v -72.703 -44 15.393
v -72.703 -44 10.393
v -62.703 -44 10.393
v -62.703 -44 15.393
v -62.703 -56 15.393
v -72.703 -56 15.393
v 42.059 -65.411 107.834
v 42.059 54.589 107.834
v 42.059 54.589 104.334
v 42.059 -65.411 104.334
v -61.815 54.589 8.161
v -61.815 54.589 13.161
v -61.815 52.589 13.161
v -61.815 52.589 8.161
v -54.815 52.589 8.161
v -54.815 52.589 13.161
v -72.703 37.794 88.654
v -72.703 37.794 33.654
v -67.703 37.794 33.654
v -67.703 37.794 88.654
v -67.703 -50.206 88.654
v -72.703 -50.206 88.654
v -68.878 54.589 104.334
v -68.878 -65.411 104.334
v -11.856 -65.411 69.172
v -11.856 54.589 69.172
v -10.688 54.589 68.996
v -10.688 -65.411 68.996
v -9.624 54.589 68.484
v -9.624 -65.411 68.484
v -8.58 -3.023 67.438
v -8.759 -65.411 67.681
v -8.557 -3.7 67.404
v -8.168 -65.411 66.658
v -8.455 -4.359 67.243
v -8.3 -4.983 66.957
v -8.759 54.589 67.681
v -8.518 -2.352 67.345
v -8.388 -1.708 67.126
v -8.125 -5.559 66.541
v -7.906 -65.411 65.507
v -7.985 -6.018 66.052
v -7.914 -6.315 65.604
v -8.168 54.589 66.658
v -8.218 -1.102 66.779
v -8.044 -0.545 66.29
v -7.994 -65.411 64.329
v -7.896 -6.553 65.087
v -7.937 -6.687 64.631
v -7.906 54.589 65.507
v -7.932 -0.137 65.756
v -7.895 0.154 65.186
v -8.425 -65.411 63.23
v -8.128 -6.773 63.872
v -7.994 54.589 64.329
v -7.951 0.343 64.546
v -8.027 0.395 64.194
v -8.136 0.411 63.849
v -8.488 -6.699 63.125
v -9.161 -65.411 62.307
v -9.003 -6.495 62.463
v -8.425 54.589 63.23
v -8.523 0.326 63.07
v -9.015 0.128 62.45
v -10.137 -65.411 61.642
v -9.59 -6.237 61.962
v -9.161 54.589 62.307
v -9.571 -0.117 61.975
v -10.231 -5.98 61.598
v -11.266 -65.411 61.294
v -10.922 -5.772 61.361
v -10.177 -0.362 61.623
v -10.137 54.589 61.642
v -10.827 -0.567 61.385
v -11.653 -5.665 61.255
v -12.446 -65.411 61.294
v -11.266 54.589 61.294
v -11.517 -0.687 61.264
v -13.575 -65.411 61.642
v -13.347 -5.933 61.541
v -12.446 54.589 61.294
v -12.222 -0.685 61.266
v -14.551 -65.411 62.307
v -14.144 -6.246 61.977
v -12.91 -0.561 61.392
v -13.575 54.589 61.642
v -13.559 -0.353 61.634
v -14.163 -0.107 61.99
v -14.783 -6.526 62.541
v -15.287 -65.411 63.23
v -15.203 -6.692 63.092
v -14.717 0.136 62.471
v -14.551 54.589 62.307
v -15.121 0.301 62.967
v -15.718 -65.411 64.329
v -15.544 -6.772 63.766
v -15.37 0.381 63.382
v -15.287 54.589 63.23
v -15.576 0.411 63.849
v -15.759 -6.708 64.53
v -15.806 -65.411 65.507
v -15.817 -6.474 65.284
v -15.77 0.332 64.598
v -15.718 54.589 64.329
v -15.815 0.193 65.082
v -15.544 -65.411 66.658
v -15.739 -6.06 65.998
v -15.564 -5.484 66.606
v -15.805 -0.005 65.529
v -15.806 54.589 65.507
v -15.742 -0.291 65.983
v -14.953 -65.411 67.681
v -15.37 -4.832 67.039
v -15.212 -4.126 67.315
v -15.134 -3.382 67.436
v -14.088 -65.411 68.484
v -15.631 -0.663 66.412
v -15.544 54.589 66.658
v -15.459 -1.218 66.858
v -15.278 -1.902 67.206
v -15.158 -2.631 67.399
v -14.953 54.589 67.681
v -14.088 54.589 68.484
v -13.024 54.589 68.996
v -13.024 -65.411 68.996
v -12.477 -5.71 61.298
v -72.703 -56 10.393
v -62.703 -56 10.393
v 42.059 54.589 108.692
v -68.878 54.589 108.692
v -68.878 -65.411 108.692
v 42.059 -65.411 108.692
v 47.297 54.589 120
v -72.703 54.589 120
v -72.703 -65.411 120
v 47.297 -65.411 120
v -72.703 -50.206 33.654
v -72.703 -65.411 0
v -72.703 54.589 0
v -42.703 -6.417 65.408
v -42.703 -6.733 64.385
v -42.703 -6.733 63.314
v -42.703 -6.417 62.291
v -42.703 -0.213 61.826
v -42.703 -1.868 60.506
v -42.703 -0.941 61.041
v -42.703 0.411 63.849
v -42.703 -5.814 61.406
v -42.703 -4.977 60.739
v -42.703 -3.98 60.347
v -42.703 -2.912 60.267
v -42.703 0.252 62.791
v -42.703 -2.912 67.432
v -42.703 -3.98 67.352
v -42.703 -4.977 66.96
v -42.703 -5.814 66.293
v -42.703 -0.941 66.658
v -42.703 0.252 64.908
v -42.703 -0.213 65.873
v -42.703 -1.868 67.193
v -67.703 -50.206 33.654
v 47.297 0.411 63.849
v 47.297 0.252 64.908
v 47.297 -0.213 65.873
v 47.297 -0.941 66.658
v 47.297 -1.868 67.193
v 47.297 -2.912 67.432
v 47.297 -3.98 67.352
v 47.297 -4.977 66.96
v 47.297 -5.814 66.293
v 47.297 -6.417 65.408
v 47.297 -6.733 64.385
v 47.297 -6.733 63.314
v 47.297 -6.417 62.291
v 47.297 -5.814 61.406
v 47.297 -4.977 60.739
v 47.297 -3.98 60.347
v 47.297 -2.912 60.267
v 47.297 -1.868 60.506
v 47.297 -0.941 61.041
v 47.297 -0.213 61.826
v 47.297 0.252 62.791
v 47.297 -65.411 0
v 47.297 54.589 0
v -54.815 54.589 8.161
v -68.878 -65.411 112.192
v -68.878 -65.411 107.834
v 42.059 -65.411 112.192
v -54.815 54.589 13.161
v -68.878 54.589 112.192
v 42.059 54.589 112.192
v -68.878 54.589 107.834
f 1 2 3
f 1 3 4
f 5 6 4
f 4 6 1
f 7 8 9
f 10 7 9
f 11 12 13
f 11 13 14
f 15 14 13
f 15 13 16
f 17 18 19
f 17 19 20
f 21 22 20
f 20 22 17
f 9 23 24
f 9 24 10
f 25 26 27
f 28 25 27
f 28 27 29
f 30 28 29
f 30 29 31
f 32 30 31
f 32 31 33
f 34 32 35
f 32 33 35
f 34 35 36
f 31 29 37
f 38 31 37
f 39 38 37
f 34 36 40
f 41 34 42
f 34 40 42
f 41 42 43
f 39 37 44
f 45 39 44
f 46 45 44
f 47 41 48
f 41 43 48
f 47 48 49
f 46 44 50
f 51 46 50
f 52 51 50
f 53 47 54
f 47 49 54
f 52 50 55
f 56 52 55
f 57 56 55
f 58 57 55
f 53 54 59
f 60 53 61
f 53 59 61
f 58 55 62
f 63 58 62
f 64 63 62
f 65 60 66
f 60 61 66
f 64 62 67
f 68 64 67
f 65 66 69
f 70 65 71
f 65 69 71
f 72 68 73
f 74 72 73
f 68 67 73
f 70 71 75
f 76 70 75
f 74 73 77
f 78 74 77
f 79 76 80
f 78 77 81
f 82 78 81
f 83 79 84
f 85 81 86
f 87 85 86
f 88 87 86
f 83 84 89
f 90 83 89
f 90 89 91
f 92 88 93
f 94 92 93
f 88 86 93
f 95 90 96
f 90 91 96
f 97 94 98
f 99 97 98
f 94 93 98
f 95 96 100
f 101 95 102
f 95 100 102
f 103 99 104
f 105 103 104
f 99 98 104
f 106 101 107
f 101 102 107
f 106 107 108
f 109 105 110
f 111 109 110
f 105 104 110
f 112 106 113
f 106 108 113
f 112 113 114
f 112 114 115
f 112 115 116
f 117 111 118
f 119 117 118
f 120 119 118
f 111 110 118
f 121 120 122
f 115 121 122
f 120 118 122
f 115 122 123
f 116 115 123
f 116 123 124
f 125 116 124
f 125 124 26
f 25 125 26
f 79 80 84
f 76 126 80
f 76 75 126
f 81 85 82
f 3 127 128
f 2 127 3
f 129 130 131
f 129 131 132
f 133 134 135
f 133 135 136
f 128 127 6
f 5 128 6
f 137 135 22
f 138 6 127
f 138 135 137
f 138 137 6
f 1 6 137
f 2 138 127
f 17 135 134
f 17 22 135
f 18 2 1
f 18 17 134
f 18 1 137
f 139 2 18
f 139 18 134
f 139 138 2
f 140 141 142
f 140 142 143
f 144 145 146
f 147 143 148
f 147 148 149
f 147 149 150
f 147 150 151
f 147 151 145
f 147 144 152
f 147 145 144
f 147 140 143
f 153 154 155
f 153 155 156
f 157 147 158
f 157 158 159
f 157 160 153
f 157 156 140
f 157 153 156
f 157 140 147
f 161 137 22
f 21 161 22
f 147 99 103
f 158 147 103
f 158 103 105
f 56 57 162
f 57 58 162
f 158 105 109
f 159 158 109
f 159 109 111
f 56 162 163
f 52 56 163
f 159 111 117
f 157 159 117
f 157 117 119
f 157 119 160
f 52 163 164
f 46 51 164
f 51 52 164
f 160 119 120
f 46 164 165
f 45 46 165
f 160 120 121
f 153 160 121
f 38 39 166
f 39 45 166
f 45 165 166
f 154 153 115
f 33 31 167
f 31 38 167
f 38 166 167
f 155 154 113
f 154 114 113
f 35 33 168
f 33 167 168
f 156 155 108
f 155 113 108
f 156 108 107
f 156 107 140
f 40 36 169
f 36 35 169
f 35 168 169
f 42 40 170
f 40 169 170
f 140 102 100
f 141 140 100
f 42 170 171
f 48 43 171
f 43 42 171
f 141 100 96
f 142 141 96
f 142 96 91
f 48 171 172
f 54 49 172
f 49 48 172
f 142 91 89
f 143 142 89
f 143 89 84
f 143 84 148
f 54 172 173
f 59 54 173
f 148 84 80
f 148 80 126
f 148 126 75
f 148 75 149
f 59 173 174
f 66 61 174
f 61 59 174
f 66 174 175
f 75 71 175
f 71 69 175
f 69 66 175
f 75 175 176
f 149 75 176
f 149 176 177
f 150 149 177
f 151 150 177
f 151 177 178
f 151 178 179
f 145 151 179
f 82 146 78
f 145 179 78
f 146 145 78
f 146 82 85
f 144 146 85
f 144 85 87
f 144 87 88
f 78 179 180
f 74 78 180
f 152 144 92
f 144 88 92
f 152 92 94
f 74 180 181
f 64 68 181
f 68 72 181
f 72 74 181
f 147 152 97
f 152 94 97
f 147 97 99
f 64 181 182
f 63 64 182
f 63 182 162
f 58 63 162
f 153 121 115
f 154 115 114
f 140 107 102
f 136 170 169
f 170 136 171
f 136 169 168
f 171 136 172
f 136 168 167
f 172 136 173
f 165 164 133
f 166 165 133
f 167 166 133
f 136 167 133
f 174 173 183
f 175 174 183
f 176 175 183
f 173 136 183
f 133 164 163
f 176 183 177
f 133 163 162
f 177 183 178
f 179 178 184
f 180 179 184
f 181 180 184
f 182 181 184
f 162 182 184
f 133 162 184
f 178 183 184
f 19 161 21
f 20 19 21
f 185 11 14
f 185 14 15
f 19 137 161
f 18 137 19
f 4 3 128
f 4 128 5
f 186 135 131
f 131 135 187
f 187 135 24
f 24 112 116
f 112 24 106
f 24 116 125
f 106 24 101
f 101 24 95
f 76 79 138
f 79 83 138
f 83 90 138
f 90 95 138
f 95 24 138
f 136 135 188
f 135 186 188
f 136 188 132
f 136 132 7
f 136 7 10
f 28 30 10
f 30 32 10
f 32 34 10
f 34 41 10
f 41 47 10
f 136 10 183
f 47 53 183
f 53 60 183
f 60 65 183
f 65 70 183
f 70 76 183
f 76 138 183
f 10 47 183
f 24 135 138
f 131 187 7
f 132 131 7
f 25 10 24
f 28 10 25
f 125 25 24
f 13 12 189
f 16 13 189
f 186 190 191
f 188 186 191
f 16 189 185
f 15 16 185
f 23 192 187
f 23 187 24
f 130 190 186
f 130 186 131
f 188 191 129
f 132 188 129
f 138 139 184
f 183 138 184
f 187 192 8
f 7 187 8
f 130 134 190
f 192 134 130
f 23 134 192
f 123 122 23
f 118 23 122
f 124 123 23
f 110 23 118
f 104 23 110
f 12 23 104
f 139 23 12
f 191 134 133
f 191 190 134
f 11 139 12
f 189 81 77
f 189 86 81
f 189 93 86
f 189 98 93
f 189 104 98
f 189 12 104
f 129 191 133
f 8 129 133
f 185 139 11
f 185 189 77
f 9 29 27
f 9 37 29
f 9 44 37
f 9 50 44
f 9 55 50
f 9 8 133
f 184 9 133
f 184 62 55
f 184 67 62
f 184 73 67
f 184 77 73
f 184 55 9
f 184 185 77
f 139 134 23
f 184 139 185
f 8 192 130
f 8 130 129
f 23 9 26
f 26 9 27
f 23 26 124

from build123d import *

# Parameters (mm, degrees)
ESBO_O1_W                = 120
ESBO_O1_H                = 120
RESSALTO_EXTRUS_O1_DEPTH = 120
ESBO_O2_W                = 55
ESBO_O2_H                = 88
CORTE_EXTRUS_O2_DEPTH    = 5
ESBO_O3_W                = 110.936399694
ESBO_O3_H                = 3.5
CORTE_EXTRUS_O3_DEPTH    = 142
ESBO_O4_W                = 7
ESBO_O4_H                = 5
CORTE_EXTRUS_O5_DEPTH    = 2
ESBO_O5_W                = 5
ESBO_O5_H                = 12
CORTE_EXTRUS_O6_DEPTH    = 10
ESBO_O6_R                = 3.961568313
CORTE_EXTRUS_O7_DEPTH    = 230
ESBO_O7_R                = 3.592178765
CORTE_EXTRUS_O8_DEPTH    = 90


with BuildPart() as part:
    # Esboço1 → Ressalto-extrusão1 (new body)
    with BuildSketch(Plane.XY):
        with Locations((-12.702949292, -5.410650407)):
            Rectangle(ESBO_O1_W, ESBO_O1_H)
    extrude(amount=RESSALTO_EXTRUS_O1_DEPTH)

    # Esboço2 → Corte-extrusão2 (cut)
    with BuildSketch(Plane.ZY.offset(72.702949292)):
        with Locations((61.153940809, -6.205937977)):
            Rectangle(ESBO_O2_W, ESBO_O2_H)
    extrude(amount=-CORTE_EXTRUS_O2_DEPTH, mode=Mode.SUBTRACT)

    # Esboço3 → Corte-extrusão3 (cut)
    with BuildSketch(Plane(origin=(0, 54.589349593, 0), x_dir=(1, 0, 0), z_dir=(0, 1, 0))):
        with Locations((-13.409376007, -110.441569905)):
            Rectangle(ESBO_O3_W, ESBO_O3_H)
        with Locations((-13.409376007, -106.084018742)):
            Rectangle(ESBO_O3_W, ESBO_O3_H)
    extrude(amount=-CORTE_EXTRUS_O3_DEPTH, mode=Mode.SUBTRACT)

    # Esboço4 → Corte-extrusão5 (cut)
    with BuildSketch(Plane(origin=(0, 54.589349593, 0), x_dir=(1, 0, 0), z_dir=(0, 1, 0))):
        with Locations((-58.31528793, -10.660946626)):
            Rectangle(ESBO_O4_W, ESBO_O4_H)
    extrude(amount=-CORTE_EXTRUS_O5_DEPTH, mode=Mode.SUBTRACT)

    # Esboço5 → Corte-extrusão6 (cut)
    with BuildSketch(Plane.ZY.offset(72.702949292)):
        with Locations((12.892561397, -49.999881636)):
            Rectangle(ESBO_O5_W, ESBO_O5_H)
    extrude(amount=-CORTE_EXTRUS_O6_DEPTH, mode=Mode.SUBTRACT)

    # Esboço6 → Corte-extrusão7 (cut)
    with BuildSketch(Plane(origin=(0, 54.589349593, 0), x_dir=(1, 0, 0), z_dir=(0, 1, 0))):
        with Locations(Location((-11.856000819, -65.210905781, 0), (0, 0, 270))):
            Circle(ESBO_O6_R)
    extrude(amount=-CORTE_EXTRUS_O7_DEPTH, mode=Mode.SUBTRACT)

    # Esboço7 → Corte-extrusão8 (cut)
    with BuildSketch(Plane(origin=(47.297050708, 0, 0), x_dir=(0, 0, -1), z_dir=(1, 0, 0))):
        with Locations(Location((-63.849475515, -3.180838573, 0), (0, 0, 90))):
            Circle(ESBO_O7_R)
    extrude(amount=-CORTE_EXTRUS_O8_DEPTH, mode=Mode.SUBTRACT)


solid = part.part
